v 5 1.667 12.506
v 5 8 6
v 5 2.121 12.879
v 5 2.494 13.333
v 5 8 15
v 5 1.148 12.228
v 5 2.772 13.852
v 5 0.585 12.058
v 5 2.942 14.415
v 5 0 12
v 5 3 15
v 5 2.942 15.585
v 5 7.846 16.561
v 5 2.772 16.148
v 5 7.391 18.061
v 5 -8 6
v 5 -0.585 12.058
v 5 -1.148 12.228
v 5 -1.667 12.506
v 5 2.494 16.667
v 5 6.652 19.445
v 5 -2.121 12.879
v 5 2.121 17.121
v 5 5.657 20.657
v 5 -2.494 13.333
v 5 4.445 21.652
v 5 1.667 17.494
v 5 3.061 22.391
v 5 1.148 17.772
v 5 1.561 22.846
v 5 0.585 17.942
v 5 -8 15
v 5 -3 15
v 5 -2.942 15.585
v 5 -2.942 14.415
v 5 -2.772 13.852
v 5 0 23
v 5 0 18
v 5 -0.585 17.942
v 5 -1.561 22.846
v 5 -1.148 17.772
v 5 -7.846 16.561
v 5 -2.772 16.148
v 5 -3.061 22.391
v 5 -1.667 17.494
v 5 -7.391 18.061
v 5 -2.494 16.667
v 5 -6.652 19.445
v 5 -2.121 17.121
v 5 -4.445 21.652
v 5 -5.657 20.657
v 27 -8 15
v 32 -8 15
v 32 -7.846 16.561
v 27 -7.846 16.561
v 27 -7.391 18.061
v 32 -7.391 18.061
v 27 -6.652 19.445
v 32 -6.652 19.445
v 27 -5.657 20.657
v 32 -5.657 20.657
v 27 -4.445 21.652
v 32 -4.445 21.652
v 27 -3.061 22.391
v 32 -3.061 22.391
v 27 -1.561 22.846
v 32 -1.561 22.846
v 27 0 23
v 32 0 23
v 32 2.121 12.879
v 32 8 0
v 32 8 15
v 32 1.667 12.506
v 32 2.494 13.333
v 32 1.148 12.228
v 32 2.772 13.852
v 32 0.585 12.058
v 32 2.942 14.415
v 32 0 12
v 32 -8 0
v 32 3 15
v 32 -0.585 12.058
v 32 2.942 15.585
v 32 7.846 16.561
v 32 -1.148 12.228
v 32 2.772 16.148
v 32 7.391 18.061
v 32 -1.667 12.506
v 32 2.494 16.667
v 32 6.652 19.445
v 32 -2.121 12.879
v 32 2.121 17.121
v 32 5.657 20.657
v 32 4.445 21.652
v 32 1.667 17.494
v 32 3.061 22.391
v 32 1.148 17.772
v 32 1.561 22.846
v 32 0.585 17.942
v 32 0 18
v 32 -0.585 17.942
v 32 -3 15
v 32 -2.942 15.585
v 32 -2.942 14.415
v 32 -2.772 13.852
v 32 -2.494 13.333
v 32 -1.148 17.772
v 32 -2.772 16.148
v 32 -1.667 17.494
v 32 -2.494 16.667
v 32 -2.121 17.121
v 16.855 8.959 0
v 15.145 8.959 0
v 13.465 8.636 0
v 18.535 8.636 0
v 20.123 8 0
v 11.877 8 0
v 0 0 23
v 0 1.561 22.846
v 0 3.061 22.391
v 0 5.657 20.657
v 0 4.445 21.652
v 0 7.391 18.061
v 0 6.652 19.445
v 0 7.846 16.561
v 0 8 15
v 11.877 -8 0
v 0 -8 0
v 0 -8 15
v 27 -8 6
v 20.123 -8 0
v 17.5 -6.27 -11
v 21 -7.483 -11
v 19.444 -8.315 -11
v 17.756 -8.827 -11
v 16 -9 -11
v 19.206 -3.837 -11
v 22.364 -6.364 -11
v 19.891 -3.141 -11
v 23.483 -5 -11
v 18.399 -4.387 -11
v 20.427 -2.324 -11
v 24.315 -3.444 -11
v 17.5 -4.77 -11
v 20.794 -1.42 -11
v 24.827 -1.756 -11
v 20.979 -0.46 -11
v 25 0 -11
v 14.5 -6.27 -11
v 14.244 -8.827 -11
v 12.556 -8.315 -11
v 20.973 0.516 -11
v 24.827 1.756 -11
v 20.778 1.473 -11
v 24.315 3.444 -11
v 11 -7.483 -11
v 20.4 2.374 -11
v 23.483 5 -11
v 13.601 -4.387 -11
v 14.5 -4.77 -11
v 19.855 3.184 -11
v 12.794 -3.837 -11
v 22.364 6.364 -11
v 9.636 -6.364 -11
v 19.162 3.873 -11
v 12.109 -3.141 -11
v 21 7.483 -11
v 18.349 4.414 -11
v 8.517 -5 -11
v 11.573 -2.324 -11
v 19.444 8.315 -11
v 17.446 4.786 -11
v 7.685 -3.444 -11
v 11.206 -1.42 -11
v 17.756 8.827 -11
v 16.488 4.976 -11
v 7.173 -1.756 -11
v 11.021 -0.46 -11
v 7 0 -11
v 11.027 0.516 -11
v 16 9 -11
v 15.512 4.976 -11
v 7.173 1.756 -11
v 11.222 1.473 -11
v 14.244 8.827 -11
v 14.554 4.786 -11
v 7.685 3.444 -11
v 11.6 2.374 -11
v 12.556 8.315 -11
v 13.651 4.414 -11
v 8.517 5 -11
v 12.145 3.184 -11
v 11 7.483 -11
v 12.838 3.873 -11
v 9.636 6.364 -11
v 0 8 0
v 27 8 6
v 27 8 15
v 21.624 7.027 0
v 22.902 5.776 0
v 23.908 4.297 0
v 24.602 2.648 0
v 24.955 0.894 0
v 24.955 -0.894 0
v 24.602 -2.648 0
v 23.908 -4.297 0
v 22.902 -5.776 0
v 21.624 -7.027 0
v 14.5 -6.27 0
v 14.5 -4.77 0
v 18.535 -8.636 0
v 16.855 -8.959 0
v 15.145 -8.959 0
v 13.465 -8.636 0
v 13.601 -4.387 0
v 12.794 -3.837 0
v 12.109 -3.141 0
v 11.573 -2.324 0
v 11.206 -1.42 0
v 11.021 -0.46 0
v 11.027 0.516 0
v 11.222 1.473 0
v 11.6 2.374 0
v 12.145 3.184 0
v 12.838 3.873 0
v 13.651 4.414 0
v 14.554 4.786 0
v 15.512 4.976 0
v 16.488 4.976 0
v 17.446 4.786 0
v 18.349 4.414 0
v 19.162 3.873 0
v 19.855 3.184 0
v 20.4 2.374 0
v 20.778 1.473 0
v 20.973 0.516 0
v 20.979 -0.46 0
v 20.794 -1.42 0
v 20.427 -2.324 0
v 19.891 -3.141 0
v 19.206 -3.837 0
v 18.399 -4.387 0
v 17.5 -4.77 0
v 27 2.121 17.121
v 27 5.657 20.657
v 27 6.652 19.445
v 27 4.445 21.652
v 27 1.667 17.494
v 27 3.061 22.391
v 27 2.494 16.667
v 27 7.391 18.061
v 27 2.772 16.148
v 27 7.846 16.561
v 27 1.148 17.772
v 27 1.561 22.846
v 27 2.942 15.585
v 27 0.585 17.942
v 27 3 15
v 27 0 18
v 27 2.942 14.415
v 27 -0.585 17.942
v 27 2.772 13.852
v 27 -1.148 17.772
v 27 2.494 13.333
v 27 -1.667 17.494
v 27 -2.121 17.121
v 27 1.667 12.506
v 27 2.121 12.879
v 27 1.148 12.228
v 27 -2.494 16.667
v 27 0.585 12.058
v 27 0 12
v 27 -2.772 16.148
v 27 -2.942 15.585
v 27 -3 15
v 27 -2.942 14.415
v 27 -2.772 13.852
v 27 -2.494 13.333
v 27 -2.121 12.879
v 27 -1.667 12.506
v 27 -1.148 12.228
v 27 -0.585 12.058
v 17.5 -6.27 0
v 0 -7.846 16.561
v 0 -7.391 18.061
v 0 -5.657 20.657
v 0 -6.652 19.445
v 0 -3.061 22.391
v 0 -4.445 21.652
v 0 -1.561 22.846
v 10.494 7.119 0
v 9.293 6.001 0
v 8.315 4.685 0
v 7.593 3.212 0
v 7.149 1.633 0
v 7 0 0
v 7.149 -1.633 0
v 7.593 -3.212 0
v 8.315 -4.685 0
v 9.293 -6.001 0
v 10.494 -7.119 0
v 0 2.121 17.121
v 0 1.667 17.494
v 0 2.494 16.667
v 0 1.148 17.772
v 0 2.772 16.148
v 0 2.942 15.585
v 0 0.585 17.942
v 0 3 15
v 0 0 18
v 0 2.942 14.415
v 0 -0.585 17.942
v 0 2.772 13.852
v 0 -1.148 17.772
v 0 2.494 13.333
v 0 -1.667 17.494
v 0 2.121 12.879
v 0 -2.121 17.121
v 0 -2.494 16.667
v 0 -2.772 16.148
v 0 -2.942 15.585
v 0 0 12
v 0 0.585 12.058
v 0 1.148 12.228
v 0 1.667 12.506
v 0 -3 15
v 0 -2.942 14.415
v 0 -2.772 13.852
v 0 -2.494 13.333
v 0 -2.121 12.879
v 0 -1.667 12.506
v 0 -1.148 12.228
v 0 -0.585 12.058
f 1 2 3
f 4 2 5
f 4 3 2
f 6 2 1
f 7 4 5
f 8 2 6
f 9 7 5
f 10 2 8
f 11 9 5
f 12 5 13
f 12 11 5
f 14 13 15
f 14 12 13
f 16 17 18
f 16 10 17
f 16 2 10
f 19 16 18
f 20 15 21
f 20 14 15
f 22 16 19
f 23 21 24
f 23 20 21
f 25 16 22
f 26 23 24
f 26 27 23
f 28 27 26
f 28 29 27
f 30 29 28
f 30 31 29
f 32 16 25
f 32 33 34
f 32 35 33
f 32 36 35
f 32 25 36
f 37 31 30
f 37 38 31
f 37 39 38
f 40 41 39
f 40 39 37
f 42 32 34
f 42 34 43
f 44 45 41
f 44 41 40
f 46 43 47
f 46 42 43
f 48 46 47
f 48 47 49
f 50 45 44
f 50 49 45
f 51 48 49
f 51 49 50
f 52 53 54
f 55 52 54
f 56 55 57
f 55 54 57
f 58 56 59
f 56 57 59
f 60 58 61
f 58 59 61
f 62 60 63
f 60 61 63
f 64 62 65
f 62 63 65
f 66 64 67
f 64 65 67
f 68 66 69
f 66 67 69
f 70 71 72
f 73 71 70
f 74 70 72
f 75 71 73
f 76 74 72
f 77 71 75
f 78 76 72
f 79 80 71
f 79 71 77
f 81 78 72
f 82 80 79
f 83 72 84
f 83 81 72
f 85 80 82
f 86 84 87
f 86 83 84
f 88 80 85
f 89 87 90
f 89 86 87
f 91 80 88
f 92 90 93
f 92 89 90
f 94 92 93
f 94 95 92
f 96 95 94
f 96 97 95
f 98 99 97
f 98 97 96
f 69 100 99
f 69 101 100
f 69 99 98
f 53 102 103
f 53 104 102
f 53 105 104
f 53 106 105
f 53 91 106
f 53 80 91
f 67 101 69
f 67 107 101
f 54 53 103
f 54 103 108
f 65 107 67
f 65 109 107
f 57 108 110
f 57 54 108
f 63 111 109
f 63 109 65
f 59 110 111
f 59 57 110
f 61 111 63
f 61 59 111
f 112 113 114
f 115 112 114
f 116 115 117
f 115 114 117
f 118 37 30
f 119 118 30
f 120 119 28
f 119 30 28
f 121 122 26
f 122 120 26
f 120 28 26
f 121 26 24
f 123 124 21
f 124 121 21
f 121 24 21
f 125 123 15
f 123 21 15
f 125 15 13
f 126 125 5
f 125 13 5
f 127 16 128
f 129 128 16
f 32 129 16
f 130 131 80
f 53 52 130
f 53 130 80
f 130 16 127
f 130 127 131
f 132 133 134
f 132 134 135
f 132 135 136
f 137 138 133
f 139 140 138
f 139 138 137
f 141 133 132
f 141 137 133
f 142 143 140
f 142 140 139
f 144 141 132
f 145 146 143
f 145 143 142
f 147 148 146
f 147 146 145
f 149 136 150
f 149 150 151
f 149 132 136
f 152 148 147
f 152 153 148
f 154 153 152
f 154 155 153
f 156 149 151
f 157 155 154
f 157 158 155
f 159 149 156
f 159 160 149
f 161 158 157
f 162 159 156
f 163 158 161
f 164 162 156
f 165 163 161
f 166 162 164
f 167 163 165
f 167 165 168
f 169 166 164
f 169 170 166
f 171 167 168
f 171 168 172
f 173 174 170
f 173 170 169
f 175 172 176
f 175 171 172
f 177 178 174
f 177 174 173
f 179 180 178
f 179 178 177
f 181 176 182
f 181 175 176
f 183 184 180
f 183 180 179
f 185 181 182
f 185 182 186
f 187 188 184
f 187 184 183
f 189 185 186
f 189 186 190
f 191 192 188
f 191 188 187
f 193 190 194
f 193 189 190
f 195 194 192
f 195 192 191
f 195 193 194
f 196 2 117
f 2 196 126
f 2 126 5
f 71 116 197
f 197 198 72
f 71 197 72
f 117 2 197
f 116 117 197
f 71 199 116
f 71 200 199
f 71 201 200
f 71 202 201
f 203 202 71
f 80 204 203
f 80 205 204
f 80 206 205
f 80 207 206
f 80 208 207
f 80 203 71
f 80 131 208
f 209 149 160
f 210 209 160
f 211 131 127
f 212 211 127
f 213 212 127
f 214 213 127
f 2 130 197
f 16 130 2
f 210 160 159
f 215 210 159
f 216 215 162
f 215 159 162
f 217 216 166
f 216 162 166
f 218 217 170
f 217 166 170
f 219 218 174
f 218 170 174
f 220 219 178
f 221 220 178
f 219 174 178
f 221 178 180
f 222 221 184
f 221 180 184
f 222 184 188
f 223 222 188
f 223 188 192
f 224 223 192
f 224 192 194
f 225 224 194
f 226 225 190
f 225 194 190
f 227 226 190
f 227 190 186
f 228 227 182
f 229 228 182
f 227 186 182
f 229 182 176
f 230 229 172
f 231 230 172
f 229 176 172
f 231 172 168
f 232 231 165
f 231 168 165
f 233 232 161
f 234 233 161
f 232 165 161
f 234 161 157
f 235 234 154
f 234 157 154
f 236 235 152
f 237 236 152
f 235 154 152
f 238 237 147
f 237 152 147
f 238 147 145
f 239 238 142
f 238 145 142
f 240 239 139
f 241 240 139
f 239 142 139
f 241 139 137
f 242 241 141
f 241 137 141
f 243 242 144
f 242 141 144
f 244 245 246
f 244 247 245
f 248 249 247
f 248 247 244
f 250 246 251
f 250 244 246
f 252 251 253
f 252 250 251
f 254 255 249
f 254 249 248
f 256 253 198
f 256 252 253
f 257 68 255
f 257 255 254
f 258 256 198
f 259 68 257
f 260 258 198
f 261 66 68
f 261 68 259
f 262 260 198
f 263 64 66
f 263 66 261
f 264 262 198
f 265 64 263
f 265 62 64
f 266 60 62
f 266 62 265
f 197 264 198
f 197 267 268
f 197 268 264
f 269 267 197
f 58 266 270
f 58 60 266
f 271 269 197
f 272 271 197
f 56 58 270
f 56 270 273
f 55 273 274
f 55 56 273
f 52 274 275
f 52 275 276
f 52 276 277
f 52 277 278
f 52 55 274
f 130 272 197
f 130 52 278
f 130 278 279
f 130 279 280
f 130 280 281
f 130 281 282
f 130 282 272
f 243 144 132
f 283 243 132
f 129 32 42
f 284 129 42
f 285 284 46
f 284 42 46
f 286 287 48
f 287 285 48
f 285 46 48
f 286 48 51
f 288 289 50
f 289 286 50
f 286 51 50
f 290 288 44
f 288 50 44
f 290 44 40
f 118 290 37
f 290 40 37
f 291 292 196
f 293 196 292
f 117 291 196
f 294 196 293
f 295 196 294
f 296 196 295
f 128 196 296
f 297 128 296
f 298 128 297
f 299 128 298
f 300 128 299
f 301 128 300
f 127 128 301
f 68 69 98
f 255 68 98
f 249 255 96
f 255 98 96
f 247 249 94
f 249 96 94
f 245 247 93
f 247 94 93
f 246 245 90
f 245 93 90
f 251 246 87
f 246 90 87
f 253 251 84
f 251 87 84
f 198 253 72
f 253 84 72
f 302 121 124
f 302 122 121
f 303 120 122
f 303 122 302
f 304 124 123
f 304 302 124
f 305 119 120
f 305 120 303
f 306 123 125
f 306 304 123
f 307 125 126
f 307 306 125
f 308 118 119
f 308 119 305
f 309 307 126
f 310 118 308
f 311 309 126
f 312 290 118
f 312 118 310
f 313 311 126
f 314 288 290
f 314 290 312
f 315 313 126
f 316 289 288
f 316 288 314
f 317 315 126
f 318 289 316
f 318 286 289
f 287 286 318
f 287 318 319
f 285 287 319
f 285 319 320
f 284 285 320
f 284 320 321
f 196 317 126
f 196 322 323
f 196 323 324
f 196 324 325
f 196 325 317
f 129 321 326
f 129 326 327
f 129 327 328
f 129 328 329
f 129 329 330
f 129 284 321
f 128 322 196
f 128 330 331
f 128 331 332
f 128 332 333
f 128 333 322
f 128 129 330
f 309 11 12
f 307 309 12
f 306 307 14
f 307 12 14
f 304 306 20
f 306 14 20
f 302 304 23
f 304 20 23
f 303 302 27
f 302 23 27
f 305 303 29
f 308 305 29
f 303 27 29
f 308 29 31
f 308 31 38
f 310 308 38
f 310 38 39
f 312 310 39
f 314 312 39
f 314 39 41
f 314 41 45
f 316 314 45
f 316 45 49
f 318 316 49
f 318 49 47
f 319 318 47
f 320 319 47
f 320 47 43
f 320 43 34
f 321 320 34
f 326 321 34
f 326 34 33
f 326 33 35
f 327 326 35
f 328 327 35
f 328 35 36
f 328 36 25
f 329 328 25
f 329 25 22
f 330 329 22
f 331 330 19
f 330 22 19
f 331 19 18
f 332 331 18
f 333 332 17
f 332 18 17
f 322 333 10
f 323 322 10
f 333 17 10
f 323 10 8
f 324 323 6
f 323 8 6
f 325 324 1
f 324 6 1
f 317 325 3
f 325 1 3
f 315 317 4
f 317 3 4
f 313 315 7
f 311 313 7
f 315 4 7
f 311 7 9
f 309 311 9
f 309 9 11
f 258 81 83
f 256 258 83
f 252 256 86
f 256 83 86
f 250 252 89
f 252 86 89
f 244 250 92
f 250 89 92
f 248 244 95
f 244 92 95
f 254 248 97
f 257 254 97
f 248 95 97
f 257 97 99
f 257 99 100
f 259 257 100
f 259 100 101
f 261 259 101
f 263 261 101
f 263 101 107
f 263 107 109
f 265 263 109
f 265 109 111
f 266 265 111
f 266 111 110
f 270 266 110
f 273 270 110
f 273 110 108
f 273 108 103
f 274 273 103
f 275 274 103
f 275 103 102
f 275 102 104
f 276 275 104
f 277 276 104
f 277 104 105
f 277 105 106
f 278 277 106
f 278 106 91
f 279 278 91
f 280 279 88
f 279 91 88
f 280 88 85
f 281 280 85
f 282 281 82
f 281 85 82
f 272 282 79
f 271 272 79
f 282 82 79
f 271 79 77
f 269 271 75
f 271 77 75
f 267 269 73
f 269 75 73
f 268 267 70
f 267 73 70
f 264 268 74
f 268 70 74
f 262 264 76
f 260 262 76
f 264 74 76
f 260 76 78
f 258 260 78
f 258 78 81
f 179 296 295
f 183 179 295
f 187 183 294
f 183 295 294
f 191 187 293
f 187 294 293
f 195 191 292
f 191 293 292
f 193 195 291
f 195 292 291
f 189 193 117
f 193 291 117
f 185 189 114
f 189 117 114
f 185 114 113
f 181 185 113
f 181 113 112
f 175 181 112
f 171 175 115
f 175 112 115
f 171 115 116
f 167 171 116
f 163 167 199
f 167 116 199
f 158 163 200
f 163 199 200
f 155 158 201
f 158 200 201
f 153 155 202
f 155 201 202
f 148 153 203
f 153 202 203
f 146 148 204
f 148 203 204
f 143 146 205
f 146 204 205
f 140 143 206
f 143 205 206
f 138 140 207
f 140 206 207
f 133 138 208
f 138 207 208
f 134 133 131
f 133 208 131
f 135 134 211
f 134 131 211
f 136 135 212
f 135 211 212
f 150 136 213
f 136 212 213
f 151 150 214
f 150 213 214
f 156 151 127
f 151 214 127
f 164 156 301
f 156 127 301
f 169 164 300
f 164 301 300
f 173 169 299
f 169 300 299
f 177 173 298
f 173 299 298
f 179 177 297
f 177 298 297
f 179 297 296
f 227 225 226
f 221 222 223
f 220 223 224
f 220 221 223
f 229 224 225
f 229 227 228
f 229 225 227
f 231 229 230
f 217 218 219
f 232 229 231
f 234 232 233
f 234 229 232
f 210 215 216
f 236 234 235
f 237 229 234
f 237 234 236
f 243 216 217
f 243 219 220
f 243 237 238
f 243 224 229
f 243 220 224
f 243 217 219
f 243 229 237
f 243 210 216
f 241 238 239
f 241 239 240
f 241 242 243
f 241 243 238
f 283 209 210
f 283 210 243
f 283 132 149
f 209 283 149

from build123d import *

# Parameters (mm, degrees)
F0_W     = 9
F0_H     = 11
F2_DEPTH = 8
F4_DEPTH = 11
F5_R     = 3
F6_DEPTH = 32.001


# Not quite as in the source:
# - a feature names something its author has since deleted; it is built from what else it names


with BuildPart() as f1:
    # F0 (on Front) → F1 (revolve)
    with BuildSketch(Plane.XZ):
        with Locations((11.5, -5.5)):
            Rectangle(F0_W, F0_H)
    revolve(axis=Axis((16, 0, -5.5), (0, 0, -1)))

    # F0 (on Front) → F2 (join, symmetric)
    with BuildSketch(Plane.XZ):
        Polygon((0, 23), (0, 0), (7, 0), (16, 0), (32, 0), (32, 23), (27, 23), (27, 6), (5, 6), (5, 23), align=None)
    extrude(amount=F2_DEPTH, both=True)

    # F3 (on face) → F4 (cut)
    with BuildSketch(Plane(origin=(0, 0, -11), x_dir=(1, 0, 0), z_dir=(0, 0, -1))):
        with BuildLine():
            Line((14.5, 6.2696960071), (14.5, 4.7696960071))
            ThreePointArc((14.5, 4.7696960071), (16, -5), (17.5, 4.7696960071))
            Line((17.5, 4.7696960071), (17.5, 6.2696960071))
            Line((17.5, 6.2696960071), (14.5, 6.2696960071))
        make_face()
    extrude(amount=-F4_DEPTH, mode=Mode.SUBTRACT)

    # F5 (on face) → F6 (cut, through all)
    with BuildSketch(Plane.YZ.offset(32)):
        with Locations((0, 15)):
            Circle(F5_R)
        with BuildLine():
            ThreePointArc((-8, 15), (-5.6568542495, 20.6568542495), (0, 23))
            Line((0, 23), (-8, 23))
            Line((-8, 23), (-8, 15))
        make_face()
        with BuildLine():
            ThreePointArc((0, 23), (5.6568542495, 20.6568542495), (8, 15))
            Line((8, 15), (8, 23))
            Line((8, 23), (0, 23))
        make_face()
    extrude(amount=-F6_DEPTH, mode=Mode.SUBTRACT)


solid = f1.part
